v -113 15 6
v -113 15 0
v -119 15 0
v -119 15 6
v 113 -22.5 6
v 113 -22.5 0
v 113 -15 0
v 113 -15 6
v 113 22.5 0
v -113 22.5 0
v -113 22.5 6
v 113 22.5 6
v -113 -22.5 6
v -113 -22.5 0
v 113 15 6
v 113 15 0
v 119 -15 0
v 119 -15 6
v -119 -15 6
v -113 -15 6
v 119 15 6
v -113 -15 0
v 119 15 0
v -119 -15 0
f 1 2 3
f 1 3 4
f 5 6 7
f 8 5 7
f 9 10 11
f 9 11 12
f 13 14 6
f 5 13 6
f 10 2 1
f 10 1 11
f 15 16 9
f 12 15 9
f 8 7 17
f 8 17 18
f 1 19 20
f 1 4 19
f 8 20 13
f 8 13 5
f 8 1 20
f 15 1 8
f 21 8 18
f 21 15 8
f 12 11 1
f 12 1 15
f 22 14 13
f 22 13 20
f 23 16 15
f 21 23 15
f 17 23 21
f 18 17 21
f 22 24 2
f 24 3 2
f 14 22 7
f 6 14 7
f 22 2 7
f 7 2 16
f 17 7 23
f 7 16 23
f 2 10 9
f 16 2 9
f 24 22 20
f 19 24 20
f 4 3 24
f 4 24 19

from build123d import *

# Parameters (mm, degrees)
CROQUIS1_W                   = 226
CROQUIS1_H                   = 45
SALIENTE_EXTRUIR1_DEPTH      = 6
CROQUIS2_W                   = 6
CROQUIS2_H                   = 30
SALIENTE_EXTRUIR2_DEPTH      = 6
SALIENTE_EXTRUIR2_DEPTH_BACK = 232


with BuildPart() as part:
    # Croquis1 → Saliente-Extruir1 (new body)
    with BuildSketch(Plane.XY):
        Rectangle(CROQUIS1_W, CROQUIS1_H)
    extrude(amount=SALIENTE_EXTRUIR1_DEPTH)

    # Croquis2 → Saliente-Extruir2 (add, two sides)
    with BuildSketch(Plane.ZY.offset(113)) as saliente_extruir2_sk:
        with Locations((3, 0)):
            Rectangle(CROQUIS2_W, CROQUIS2_H)
    extrude(amount=SALIENTE_EXTRUIR2_DEPTH)
    extrude(saliente_extruir2_sk.sketch, amount=-SALIENTE_EXTRUIR2_DEPTH_BACK)


solid = part.part
